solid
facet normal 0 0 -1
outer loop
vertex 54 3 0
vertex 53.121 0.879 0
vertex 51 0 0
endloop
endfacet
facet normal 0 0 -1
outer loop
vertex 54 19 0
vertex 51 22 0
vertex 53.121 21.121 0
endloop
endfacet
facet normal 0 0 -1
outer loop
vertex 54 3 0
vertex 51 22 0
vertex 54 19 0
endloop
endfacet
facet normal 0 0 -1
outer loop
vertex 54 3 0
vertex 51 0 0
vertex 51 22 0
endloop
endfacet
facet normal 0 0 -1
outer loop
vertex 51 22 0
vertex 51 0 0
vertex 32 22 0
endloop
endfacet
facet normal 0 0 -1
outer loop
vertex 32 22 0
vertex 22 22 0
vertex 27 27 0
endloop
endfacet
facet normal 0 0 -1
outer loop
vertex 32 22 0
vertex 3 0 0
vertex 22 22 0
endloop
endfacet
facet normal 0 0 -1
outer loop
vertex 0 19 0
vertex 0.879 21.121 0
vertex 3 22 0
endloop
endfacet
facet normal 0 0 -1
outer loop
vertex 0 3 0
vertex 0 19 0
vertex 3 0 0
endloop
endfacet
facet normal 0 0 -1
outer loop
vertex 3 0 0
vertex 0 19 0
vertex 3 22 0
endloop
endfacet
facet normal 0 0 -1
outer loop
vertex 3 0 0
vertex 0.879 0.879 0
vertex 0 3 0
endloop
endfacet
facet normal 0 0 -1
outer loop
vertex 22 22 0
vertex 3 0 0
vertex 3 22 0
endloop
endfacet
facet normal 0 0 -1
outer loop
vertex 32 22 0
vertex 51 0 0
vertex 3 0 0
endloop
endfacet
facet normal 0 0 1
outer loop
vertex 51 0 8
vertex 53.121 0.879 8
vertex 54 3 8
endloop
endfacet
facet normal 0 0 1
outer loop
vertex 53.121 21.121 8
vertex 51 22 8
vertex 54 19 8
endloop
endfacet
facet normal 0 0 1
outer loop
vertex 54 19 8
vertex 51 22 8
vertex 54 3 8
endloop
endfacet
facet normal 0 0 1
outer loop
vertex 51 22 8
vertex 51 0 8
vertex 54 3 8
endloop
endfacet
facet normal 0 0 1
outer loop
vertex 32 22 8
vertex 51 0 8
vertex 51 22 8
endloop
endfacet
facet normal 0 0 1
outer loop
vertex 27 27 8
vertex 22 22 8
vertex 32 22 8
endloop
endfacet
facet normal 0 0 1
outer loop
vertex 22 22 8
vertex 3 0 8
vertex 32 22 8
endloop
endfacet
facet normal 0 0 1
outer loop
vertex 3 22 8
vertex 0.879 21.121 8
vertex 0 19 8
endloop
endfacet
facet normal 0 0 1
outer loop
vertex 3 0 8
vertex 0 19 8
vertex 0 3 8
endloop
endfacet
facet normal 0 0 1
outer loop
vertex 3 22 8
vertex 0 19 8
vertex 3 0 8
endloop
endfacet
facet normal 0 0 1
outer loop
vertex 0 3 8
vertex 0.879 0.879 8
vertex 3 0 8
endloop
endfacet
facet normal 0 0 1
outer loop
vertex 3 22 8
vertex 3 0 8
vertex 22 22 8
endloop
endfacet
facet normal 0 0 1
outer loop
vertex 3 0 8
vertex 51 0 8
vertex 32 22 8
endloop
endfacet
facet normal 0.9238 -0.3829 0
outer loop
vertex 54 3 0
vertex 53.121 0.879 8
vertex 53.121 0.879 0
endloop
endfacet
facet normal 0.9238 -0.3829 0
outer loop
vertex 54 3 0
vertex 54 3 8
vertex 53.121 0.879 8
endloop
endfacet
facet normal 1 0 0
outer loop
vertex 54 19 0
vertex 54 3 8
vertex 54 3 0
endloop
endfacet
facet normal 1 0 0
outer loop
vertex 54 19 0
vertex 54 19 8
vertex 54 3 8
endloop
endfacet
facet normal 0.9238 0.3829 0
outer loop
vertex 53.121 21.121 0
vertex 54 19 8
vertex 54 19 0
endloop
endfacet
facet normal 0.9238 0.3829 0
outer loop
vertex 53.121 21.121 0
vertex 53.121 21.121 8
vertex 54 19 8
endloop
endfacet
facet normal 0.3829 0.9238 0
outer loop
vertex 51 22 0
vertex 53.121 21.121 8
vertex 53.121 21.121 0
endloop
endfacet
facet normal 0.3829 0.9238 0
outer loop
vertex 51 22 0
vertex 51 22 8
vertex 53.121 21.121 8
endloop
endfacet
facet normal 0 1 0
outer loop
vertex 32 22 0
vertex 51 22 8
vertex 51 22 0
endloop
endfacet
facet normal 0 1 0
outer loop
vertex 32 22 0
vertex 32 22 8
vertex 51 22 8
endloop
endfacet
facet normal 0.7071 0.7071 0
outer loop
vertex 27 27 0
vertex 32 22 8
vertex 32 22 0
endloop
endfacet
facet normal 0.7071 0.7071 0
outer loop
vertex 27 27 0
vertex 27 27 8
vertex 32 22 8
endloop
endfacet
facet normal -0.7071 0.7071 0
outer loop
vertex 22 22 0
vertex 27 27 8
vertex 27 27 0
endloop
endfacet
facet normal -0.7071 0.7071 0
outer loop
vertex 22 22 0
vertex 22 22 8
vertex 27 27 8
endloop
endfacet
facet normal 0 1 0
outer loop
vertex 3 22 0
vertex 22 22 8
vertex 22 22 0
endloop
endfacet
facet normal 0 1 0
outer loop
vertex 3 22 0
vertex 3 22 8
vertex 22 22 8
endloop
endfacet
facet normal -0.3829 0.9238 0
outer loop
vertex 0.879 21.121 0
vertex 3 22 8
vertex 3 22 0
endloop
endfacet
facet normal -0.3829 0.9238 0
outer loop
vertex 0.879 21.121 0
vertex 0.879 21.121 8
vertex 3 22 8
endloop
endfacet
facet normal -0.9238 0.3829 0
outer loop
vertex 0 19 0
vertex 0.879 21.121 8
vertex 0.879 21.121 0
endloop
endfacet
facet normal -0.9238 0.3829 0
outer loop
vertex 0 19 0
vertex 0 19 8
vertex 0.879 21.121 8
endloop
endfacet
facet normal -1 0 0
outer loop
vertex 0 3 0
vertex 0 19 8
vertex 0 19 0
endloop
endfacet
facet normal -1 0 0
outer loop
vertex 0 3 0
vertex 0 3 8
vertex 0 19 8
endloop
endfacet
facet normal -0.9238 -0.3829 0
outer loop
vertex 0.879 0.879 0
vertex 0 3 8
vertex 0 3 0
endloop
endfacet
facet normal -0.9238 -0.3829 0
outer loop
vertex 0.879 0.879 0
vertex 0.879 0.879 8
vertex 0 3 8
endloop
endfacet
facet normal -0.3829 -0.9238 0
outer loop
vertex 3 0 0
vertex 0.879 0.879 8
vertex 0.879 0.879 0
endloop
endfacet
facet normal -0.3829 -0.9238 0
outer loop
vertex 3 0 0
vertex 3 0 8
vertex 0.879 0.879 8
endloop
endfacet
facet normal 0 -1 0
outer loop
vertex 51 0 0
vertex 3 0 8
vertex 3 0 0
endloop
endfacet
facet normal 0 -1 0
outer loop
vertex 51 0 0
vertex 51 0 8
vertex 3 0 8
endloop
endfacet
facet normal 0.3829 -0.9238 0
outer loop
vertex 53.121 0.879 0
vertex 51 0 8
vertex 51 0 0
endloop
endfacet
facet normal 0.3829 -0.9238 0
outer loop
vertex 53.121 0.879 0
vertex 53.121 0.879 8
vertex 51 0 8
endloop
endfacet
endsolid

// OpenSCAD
$fn = 32;

// ----------------------------------------------------------------------
// Ratchet pawl: 54 x 22 mm body, beak 5 mm сверху
// ----------------------------------------------------------------------

// --- parameters (mm) ---
profile_height = 8;       // extrusion height
profile_points = 15;      // points of the closed outline

profile = [[0, 3], [0.879, 0.879], [3, 0], [51, 0], [53.121, 0.879], [54, 3], [54, 19], [53.121, 21.121], [51, 22], [32, 22], [27, 27], [22, 22], [3, 22], [0.879, 21.121], [0, 19]];  // single closed polygon, 15 points, counter clockwise

// --- the one profile operation ---
linear_extrude(height = profile_height) polygon(points = profile);
